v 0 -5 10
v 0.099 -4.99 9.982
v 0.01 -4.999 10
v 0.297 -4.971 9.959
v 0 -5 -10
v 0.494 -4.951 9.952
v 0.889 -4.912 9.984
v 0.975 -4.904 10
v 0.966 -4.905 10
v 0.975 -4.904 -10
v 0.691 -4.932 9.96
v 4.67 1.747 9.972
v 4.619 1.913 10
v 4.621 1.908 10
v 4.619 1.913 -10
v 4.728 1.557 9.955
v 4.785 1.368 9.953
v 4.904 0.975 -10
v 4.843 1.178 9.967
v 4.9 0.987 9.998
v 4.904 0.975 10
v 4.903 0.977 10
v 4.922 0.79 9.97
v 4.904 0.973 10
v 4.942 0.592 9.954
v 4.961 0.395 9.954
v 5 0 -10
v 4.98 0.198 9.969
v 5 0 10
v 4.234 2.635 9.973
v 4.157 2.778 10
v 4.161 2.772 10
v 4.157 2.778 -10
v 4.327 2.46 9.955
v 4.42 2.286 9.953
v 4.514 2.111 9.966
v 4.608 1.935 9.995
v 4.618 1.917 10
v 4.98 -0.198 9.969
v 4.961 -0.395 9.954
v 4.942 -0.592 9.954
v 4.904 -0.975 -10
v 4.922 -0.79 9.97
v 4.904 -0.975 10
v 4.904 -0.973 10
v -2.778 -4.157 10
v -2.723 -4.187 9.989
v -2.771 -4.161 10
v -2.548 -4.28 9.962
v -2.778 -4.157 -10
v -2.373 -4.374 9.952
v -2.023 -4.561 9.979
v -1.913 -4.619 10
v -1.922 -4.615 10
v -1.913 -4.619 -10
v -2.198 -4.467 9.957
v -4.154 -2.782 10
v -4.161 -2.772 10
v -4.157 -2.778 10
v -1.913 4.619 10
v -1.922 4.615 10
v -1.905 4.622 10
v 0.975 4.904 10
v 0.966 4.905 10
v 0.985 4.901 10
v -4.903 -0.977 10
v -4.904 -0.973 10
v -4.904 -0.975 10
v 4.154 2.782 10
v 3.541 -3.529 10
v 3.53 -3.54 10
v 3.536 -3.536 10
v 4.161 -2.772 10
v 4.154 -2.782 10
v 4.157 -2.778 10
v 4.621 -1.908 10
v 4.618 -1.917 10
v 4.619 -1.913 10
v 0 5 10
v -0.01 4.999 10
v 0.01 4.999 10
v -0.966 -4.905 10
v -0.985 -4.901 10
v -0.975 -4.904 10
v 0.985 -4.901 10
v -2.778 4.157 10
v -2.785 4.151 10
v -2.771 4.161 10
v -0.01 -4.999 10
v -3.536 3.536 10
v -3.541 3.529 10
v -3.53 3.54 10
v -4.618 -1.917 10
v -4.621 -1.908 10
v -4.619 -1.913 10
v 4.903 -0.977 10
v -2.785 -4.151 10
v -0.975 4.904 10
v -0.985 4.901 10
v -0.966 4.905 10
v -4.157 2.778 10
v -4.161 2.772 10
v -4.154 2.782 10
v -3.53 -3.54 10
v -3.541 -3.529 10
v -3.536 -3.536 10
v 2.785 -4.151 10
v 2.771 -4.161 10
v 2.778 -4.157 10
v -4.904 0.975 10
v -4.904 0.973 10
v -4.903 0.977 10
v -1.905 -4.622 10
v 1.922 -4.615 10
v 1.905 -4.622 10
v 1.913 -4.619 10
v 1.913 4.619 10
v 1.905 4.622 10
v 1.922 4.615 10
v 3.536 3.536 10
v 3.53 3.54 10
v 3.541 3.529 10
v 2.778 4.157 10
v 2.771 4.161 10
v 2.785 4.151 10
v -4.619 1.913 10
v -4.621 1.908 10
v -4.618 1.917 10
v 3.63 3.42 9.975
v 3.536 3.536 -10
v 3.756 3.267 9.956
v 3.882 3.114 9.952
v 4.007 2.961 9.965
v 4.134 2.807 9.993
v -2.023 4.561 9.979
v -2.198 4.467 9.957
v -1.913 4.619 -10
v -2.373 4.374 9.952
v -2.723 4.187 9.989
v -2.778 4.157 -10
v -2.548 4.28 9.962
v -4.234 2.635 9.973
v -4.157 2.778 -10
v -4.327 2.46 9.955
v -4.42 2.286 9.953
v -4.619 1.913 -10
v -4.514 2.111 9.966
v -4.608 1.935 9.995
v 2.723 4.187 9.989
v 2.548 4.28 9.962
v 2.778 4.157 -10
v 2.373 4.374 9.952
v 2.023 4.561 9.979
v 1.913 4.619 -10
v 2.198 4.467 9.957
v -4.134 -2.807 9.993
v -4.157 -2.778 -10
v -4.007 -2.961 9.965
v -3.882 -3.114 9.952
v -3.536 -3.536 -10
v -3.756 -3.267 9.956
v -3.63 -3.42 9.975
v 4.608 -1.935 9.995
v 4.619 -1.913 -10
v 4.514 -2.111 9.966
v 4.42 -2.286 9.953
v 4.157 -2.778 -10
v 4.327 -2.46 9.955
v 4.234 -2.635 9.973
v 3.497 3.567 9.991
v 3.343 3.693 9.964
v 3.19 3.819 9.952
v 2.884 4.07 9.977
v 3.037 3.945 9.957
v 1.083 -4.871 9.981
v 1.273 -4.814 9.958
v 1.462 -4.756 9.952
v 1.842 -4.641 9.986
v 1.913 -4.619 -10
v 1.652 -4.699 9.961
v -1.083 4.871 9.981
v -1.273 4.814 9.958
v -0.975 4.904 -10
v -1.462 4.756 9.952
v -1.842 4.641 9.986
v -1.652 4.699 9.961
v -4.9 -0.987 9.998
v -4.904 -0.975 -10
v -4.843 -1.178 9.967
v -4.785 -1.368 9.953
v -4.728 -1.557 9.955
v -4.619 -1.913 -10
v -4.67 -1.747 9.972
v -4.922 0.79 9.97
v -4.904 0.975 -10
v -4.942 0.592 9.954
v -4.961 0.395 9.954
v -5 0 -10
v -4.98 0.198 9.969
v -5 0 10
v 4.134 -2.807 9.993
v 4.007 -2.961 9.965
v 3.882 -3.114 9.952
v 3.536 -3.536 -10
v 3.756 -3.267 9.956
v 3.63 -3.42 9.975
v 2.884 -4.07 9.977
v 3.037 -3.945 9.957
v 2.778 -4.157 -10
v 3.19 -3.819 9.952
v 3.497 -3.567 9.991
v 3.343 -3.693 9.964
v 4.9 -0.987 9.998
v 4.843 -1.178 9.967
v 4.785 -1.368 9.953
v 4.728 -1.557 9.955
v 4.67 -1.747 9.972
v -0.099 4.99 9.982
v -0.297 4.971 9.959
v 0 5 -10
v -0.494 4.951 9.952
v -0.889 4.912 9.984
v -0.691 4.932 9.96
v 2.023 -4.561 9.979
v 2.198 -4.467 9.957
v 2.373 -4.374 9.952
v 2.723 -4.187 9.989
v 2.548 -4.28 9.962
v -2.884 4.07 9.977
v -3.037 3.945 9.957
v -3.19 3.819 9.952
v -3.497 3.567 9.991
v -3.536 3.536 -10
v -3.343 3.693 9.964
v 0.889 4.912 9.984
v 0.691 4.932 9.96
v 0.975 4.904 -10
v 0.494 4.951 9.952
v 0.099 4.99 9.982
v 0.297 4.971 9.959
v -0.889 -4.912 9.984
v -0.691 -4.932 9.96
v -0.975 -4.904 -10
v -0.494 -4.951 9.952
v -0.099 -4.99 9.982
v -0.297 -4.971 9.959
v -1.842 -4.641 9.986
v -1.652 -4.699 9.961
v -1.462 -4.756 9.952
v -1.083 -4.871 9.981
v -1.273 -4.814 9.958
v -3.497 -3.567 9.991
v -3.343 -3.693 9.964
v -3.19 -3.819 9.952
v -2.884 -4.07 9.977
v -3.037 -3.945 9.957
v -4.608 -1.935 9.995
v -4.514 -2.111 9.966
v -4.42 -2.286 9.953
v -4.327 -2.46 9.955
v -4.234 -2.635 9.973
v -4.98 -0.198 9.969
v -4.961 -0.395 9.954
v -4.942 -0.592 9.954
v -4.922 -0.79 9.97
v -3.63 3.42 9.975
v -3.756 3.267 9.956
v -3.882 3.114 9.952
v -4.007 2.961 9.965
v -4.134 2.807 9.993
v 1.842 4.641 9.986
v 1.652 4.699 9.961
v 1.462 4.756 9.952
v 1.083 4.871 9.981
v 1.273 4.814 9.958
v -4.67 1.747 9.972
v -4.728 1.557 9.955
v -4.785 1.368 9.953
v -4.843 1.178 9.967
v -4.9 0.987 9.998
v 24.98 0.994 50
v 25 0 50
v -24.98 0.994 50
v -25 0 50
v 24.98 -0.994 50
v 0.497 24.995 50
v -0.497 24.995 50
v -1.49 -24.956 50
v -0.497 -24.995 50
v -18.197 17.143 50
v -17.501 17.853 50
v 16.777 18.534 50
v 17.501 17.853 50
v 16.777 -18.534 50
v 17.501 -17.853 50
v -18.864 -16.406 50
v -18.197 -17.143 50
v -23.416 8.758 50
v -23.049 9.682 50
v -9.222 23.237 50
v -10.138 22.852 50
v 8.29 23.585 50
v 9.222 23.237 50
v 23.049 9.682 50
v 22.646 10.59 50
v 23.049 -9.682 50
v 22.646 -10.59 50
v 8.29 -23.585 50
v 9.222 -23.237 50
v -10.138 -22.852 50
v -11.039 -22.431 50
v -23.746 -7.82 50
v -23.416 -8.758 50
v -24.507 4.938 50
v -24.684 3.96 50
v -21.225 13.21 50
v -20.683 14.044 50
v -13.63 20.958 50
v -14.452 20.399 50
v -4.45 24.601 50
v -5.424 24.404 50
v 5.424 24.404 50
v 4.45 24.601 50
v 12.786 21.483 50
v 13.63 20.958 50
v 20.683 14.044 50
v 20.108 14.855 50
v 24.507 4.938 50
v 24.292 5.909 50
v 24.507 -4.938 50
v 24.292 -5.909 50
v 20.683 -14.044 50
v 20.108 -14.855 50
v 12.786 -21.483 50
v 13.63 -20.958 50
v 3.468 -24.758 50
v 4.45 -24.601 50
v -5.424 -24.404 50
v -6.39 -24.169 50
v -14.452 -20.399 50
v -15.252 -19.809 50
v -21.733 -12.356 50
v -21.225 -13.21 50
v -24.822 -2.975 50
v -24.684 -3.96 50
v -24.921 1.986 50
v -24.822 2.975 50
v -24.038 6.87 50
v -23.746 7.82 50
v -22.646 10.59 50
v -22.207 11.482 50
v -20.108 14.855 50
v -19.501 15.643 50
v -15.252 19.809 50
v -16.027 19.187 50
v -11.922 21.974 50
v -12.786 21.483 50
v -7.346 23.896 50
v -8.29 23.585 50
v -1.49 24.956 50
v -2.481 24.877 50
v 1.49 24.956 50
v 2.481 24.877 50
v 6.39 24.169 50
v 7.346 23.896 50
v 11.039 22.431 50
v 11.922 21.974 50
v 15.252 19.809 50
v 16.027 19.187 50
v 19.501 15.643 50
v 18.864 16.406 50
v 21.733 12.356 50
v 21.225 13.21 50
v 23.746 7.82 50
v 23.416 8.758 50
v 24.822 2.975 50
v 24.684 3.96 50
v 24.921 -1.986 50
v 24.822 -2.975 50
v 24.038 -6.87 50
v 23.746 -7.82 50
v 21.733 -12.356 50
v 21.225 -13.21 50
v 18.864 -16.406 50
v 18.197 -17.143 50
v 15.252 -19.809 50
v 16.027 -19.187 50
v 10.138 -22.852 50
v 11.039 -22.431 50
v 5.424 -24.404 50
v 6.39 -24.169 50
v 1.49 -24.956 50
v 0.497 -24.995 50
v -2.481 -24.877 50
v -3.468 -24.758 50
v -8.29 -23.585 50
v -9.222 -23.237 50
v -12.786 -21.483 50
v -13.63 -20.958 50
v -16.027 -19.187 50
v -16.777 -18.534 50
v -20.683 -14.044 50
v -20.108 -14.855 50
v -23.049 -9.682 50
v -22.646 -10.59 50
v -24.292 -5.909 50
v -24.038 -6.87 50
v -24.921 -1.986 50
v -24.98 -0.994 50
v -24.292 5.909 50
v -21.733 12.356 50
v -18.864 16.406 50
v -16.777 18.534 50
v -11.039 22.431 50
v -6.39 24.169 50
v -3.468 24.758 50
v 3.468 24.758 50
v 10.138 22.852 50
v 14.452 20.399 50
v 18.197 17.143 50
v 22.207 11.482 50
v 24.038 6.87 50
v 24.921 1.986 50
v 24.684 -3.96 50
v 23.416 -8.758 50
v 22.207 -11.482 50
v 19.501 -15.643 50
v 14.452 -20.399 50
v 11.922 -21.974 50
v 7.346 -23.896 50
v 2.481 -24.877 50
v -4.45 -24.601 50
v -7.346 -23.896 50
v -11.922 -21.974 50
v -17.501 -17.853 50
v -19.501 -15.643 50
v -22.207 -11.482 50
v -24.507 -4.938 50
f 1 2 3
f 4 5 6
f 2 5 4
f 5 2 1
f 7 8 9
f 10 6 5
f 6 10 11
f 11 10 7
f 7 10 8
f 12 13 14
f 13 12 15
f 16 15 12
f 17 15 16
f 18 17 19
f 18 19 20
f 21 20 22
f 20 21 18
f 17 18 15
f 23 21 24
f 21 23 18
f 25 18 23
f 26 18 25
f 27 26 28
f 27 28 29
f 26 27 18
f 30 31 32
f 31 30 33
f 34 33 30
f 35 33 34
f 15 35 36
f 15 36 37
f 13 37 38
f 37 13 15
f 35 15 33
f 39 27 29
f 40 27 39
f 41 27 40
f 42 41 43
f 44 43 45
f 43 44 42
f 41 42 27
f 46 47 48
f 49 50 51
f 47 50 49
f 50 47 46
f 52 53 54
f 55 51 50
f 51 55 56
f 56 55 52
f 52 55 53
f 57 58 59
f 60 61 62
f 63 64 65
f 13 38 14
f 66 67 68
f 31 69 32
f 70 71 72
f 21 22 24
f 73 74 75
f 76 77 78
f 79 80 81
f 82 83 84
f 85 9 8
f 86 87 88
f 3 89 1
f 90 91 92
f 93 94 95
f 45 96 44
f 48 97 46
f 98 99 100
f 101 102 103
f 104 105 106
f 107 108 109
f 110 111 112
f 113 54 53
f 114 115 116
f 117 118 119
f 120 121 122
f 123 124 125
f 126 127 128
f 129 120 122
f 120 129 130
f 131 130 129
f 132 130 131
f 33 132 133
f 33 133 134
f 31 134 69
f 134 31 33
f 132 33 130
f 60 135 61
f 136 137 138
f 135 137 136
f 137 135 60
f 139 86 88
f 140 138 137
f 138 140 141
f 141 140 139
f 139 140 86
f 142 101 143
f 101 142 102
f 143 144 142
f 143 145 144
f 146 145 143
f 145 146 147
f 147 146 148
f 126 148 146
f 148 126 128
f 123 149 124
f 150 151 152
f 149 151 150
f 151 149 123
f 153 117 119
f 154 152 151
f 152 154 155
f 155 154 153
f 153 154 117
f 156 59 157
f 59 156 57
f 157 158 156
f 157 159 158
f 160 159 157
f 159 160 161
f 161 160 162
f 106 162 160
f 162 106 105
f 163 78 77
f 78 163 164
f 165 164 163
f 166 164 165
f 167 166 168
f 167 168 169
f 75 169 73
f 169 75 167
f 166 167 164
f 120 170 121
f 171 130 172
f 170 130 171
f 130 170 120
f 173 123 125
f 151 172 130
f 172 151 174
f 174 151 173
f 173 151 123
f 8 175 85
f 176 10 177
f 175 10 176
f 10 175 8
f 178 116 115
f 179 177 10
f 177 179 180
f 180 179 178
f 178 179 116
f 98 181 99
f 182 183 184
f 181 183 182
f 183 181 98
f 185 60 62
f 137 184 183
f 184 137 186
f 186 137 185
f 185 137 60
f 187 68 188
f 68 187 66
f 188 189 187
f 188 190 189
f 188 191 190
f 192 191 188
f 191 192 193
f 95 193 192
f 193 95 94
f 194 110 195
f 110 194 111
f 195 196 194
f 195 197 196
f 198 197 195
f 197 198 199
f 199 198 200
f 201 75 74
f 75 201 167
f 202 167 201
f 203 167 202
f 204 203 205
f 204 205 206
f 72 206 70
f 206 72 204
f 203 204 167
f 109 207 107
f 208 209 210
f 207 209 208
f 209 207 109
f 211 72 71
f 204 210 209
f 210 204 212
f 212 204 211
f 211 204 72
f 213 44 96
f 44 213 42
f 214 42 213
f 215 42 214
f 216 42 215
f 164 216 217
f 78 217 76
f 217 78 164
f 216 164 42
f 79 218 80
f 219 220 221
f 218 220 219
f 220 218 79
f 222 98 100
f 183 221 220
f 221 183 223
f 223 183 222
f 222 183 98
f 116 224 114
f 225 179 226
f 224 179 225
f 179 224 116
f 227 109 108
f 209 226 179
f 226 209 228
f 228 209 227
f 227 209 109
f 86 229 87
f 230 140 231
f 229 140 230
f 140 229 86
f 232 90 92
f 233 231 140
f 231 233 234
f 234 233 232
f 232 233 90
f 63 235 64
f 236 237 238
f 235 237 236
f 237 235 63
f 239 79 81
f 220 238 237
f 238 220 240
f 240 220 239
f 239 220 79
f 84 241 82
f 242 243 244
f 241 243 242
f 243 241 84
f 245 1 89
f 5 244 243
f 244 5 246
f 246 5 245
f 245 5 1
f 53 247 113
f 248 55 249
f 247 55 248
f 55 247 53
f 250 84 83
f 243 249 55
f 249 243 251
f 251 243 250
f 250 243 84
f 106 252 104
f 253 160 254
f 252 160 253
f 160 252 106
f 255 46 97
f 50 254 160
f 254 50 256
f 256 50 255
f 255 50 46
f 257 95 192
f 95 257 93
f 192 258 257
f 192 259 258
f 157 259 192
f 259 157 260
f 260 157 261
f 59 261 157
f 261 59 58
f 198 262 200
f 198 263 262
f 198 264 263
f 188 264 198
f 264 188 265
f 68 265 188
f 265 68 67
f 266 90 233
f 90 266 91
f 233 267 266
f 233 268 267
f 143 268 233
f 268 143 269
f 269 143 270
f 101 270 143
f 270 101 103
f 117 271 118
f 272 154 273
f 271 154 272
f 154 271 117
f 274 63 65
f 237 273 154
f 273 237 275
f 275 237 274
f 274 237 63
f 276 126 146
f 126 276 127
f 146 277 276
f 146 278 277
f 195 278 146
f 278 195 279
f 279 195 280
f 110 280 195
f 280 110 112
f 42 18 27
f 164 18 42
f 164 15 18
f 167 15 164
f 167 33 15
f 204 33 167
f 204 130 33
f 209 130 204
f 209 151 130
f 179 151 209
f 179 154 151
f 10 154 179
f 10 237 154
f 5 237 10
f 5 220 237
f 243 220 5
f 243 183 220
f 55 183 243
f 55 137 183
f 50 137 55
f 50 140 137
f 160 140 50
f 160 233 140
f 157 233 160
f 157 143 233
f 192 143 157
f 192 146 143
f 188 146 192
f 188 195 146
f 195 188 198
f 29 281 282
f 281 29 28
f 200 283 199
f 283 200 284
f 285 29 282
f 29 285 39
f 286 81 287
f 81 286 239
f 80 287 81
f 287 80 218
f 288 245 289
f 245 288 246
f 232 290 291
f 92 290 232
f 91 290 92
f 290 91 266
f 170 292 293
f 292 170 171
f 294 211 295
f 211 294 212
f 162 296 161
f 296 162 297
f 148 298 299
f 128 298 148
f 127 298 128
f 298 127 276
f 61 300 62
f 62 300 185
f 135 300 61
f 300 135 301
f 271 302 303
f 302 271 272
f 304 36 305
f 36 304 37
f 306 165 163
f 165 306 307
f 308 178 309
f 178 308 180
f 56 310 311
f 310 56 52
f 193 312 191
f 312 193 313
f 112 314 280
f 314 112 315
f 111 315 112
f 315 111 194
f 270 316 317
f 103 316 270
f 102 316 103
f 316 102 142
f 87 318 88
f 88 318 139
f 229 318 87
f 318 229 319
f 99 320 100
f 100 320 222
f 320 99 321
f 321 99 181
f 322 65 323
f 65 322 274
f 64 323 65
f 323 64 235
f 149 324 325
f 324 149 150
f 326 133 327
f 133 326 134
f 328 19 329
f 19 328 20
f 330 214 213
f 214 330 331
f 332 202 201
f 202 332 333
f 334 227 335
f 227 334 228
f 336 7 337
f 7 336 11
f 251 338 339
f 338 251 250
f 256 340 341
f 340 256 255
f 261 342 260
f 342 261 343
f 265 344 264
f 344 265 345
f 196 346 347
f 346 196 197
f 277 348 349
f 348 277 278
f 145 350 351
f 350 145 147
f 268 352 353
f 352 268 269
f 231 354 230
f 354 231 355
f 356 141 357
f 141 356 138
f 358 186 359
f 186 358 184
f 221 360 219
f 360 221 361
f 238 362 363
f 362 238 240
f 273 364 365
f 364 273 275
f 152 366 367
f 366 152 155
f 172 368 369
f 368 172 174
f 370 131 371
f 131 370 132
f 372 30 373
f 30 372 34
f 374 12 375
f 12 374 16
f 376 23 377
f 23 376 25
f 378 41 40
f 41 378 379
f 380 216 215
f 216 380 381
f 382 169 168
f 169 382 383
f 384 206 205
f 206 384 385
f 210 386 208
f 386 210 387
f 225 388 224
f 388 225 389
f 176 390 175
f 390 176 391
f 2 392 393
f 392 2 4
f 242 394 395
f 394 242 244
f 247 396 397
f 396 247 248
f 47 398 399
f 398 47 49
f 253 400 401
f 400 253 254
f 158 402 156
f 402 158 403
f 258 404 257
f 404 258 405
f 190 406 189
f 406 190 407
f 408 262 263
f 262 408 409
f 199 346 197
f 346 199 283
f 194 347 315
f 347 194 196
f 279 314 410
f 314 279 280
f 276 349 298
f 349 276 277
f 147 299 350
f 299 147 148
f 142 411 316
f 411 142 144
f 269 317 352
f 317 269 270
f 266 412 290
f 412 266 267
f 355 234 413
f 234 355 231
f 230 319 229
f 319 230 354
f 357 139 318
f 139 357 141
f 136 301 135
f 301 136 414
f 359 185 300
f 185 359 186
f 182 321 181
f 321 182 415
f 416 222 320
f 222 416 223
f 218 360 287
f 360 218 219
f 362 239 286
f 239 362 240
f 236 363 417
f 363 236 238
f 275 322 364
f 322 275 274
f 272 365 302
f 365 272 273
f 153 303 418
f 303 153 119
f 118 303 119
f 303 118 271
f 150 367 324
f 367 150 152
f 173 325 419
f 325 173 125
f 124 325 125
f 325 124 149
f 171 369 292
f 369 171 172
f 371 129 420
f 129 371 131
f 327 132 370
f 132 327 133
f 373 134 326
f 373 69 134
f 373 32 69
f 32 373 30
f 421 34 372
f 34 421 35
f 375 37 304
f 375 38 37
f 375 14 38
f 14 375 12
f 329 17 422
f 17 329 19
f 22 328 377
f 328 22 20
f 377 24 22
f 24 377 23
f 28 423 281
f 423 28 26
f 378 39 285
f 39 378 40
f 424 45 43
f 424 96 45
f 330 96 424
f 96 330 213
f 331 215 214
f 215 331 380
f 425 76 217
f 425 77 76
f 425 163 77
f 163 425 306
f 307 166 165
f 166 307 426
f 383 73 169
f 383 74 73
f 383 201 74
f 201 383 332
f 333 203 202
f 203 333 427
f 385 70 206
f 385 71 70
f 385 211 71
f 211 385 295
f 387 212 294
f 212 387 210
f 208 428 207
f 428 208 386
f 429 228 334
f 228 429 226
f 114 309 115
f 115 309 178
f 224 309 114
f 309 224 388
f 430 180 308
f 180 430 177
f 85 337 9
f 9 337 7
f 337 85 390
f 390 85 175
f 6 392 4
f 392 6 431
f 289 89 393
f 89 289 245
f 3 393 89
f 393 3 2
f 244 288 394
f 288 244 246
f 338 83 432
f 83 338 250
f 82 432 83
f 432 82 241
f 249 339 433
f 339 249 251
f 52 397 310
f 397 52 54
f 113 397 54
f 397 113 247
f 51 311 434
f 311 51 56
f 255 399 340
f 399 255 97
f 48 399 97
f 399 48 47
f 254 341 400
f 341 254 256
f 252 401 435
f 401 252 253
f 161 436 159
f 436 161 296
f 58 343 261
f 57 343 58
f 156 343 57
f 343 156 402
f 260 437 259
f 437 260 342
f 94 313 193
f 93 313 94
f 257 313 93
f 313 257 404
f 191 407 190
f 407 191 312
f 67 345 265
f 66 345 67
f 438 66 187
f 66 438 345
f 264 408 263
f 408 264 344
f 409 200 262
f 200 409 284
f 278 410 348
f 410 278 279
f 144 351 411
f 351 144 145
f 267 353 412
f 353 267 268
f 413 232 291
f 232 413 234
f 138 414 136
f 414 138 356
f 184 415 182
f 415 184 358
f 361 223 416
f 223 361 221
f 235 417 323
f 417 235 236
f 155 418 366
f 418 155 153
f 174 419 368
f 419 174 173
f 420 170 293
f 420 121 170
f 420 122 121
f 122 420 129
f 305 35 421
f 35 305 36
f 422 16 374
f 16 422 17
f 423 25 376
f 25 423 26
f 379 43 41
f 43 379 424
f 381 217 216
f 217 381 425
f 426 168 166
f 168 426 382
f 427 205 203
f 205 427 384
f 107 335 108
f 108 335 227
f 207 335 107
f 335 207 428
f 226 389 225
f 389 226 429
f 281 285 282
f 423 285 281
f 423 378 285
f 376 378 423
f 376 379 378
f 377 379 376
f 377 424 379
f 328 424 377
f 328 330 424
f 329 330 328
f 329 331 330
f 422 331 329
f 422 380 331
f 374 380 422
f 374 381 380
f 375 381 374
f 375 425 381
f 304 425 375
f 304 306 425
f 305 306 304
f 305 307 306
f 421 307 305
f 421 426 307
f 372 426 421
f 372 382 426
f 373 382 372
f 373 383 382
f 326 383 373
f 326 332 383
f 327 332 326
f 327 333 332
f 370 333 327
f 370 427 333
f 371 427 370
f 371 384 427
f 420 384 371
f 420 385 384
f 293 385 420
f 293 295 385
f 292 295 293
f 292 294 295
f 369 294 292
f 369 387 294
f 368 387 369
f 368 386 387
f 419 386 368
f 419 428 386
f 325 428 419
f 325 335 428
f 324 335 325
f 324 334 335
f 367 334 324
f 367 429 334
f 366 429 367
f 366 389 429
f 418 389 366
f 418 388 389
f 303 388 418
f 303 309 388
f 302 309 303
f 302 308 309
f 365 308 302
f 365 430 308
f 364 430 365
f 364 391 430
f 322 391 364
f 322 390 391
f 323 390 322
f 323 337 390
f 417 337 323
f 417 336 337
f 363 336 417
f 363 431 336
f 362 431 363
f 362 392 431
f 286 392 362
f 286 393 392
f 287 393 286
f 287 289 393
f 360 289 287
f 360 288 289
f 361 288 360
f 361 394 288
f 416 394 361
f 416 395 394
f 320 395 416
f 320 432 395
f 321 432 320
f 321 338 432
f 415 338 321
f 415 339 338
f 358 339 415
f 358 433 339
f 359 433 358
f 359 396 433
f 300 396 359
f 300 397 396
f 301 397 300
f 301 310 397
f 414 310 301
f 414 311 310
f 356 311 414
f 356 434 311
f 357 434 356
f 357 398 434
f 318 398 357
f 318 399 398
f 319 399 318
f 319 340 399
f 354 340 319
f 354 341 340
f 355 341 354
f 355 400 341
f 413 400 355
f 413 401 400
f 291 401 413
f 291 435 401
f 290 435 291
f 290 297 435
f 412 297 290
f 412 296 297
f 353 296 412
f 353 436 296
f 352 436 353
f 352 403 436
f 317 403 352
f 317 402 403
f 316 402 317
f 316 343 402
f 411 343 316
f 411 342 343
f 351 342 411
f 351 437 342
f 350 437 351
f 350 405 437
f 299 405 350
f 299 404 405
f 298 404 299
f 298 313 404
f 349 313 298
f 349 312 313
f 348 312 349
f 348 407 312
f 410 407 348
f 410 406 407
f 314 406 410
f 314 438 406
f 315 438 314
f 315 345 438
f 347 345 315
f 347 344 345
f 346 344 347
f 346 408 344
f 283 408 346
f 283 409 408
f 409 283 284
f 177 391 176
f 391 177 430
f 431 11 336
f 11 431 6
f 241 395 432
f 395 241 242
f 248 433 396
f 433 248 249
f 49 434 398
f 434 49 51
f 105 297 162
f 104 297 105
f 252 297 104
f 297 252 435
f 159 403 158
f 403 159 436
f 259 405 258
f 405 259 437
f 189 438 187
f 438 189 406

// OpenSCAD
$fa = .01;
$fs = $preview ? 3: 1;

cylinder(20,d=10, center=true);
cylinder(50,d1=0, d2=50);
